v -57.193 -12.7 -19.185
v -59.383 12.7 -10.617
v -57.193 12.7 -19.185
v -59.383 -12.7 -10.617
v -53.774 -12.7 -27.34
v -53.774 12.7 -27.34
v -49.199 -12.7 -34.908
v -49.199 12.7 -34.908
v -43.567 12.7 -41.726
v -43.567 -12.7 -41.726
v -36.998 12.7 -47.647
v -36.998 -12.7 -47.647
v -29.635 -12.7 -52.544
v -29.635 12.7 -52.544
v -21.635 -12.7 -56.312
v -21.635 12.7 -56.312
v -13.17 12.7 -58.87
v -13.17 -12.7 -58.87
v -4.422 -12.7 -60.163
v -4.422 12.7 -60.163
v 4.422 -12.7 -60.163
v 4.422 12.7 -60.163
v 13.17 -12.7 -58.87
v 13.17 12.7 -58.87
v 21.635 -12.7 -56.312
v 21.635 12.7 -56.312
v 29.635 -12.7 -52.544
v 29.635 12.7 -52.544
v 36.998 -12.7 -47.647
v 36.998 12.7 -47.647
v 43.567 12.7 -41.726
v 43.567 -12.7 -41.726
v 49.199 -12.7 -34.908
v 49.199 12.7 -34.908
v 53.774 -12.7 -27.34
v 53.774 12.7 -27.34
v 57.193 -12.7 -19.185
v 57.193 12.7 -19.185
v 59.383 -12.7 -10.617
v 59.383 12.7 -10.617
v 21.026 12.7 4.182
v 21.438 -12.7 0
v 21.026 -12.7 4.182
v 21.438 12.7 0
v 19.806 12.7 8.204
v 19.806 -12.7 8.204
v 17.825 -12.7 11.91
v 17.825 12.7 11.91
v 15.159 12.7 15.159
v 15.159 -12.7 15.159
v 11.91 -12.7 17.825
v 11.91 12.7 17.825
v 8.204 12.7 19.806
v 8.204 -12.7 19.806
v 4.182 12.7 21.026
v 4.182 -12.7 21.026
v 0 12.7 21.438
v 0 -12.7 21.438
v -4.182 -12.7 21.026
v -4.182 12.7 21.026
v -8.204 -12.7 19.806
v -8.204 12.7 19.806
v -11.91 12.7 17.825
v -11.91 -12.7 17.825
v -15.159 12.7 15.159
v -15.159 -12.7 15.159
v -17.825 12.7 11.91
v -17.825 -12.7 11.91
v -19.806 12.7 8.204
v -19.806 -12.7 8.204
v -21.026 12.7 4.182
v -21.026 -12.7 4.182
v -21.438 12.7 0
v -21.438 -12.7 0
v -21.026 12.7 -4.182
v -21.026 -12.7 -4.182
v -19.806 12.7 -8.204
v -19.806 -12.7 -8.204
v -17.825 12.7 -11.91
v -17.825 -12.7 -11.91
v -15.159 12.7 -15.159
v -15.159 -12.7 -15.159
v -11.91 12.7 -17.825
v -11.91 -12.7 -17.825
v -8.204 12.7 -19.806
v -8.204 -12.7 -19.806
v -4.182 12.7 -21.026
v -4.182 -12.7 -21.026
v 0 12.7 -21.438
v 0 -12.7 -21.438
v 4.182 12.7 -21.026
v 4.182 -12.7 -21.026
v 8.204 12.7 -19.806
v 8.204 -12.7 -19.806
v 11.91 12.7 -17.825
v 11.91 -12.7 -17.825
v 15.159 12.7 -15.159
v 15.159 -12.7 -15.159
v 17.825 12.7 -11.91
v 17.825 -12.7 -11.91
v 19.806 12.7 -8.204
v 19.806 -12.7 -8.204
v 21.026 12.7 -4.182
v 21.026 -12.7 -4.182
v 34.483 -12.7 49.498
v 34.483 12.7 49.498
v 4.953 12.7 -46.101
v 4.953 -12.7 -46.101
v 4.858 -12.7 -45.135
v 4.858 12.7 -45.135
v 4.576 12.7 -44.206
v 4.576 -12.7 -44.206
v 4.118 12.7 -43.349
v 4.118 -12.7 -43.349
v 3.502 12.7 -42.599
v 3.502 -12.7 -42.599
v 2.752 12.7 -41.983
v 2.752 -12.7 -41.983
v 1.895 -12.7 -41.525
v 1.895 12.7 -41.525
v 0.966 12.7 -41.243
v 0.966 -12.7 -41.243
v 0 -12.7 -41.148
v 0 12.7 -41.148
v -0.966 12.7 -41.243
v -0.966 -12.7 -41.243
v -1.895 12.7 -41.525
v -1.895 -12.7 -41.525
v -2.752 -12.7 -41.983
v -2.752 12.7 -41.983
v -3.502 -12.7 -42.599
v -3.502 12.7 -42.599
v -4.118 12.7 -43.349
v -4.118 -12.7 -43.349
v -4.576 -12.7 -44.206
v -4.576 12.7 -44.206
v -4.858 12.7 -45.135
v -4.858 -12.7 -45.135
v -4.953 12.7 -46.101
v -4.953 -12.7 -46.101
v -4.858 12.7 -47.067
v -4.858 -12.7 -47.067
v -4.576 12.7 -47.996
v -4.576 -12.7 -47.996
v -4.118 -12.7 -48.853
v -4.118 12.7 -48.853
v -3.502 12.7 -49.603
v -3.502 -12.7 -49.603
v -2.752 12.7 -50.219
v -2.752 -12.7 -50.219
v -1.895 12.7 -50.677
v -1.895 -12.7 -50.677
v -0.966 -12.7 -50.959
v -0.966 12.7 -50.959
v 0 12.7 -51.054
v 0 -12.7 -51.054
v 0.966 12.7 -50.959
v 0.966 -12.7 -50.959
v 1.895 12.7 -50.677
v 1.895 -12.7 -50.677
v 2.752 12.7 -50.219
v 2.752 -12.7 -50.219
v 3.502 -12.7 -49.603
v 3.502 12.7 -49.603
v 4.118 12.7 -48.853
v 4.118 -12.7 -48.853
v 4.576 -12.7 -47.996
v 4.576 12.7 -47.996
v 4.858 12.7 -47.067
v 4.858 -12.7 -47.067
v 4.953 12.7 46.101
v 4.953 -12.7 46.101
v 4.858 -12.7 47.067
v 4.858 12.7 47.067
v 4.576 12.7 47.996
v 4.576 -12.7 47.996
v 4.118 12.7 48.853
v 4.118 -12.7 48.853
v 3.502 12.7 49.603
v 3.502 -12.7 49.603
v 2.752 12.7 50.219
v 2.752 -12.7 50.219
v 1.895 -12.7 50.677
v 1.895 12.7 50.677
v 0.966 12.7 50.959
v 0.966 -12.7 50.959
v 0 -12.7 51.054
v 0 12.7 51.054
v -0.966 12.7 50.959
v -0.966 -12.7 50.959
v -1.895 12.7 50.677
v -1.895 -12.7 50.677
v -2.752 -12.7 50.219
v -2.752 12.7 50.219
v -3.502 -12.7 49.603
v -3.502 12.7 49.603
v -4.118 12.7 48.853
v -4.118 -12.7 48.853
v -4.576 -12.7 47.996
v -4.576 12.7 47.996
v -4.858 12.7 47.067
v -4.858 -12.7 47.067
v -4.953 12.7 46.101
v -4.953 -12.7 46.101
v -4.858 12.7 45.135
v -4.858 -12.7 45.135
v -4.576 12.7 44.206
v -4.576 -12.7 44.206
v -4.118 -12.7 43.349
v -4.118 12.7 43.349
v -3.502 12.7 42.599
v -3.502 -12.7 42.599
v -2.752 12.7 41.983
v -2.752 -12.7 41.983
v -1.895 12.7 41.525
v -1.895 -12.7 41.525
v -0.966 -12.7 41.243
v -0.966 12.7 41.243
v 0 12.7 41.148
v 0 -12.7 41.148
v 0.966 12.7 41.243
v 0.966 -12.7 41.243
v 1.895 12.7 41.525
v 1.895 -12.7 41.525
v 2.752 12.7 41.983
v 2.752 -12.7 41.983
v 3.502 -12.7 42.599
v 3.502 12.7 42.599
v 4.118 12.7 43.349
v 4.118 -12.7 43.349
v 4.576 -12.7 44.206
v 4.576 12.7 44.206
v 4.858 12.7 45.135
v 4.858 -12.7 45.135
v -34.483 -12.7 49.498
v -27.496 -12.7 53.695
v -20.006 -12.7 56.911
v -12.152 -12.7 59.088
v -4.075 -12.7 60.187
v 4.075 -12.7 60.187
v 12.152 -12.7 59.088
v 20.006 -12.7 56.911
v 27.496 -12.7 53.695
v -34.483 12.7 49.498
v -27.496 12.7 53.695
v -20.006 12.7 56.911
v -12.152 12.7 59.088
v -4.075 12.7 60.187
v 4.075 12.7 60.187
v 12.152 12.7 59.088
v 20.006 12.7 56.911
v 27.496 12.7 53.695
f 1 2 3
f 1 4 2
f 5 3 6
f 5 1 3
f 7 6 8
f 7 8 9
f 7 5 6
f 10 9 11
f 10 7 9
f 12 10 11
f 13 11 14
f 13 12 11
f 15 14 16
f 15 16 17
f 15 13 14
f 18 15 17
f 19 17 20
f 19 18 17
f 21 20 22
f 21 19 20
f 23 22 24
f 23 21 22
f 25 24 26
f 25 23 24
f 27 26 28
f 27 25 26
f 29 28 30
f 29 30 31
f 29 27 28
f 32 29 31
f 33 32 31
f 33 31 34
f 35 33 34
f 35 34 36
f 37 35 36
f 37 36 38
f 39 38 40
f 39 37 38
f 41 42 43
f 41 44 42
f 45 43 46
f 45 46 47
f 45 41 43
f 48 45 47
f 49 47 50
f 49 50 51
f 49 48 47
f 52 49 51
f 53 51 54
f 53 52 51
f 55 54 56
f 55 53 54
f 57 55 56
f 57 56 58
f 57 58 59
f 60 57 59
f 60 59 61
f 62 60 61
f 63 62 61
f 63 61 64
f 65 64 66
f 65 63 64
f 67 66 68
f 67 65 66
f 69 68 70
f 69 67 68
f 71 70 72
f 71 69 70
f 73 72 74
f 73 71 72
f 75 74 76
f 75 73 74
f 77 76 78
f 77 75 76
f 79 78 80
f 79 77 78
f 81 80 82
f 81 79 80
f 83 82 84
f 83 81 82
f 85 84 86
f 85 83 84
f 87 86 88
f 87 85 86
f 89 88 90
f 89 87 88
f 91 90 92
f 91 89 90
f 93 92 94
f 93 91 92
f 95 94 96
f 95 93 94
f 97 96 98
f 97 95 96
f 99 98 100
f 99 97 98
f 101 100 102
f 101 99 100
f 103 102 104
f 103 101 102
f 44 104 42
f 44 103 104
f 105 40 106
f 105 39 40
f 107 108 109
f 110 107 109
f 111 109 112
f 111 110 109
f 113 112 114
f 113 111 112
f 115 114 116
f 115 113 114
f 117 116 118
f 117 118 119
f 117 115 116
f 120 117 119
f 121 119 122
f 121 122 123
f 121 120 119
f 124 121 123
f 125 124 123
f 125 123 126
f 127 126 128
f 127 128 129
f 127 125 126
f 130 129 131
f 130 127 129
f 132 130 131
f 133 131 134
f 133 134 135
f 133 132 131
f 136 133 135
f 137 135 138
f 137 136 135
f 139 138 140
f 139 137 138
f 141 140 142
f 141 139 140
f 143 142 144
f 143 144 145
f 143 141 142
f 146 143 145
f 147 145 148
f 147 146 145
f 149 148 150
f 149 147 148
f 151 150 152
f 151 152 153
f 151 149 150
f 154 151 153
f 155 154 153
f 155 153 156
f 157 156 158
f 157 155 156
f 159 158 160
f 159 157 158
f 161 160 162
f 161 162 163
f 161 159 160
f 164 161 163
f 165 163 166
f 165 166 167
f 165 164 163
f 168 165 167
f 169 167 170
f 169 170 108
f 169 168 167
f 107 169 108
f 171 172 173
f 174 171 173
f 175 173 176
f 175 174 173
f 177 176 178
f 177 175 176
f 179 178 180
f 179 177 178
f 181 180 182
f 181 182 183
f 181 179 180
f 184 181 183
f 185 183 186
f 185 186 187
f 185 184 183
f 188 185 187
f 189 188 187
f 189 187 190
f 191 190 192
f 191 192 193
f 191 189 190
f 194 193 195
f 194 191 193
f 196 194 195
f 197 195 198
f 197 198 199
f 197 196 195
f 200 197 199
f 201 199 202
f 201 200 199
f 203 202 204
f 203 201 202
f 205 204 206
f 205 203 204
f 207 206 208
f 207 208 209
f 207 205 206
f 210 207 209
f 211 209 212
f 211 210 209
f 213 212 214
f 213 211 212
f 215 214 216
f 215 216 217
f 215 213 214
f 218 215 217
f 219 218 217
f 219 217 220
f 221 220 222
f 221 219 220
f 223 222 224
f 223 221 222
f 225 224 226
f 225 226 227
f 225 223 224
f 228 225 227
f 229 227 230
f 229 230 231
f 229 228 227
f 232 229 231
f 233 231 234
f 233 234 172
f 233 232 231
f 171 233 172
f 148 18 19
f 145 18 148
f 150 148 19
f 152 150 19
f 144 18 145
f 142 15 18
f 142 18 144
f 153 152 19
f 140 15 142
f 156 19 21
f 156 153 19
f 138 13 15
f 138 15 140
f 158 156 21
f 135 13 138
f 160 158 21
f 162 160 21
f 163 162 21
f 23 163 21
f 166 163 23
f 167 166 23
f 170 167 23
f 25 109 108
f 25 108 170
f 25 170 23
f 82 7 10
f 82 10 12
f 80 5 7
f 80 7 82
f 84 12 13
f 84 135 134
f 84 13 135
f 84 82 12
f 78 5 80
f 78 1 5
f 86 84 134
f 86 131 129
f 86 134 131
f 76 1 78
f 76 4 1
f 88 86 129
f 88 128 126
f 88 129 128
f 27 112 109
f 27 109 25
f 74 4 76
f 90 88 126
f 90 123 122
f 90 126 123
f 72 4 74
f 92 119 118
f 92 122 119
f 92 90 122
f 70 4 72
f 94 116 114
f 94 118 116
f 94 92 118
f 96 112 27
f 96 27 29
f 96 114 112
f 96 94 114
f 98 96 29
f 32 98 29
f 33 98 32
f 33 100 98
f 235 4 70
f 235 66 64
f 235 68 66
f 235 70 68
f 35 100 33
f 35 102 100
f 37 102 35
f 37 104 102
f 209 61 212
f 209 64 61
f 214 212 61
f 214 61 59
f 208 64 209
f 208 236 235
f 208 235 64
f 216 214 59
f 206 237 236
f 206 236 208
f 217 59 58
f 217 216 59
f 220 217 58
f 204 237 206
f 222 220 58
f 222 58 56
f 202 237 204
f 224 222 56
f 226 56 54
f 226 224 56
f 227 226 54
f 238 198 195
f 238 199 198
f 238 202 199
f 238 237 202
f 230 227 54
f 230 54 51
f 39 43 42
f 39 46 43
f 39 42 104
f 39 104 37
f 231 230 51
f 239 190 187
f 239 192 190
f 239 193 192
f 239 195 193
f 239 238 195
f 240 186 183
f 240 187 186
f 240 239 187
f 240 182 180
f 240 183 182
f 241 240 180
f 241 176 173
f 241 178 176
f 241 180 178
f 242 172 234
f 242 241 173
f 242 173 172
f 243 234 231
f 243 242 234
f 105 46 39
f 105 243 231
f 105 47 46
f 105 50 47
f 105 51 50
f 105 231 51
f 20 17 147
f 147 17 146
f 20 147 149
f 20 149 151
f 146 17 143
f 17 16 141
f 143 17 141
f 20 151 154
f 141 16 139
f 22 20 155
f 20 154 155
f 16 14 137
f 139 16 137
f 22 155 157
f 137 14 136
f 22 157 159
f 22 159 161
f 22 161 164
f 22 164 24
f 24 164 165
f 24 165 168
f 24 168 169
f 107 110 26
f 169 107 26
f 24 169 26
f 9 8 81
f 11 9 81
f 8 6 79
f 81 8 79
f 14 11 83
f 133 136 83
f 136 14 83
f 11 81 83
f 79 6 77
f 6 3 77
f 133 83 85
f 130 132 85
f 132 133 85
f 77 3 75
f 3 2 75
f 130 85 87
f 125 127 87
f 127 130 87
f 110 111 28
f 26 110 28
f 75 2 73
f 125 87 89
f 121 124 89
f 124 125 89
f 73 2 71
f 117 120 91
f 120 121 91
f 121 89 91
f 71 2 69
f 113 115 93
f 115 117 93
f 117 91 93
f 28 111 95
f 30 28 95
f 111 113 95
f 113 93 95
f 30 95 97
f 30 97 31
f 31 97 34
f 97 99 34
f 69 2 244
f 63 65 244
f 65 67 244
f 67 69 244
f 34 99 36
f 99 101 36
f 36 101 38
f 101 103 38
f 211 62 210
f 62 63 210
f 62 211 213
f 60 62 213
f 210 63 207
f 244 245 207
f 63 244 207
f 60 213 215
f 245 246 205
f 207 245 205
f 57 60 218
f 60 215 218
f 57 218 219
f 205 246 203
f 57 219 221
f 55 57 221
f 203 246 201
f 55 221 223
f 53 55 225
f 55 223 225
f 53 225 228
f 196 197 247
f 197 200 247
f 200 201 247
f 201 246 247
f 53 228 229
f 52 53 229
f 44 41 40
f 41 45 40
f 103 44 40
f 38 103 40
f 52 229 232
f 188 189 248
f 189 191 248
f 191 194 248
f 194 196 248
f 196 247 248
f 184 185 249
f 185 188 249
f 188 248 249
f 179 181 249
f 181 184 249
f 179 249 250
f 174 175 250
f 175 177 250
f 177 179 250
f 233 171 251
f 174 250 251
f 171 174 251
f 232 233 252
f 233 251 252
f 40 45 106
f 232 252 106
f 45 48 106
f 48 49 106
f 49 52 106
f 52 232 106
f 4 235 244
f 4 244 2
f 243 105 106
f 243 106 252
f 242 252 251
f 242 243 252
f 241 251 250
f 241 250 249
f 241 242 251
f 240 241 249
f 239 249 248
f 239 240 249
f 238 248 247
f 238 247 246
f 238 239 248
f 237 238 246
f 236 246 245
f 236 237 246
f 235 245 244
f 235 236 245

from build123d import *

# Parameters (mm, degrees)
F0_R     = 4.953
F0_R_2   = 21.4376
F1_DEPTH = 12.7


with BuildPart() as f1:
    # F0 (on Front) → F1 (new body, symmetric)
    with BuildSketch(Plane.XZ):
        with BuildLine():
            Line((59.3833293236, -10.6172418004), (34.4828311796, 49.4978785287))
            ThreePointArc((34.4828311796, 49.4978785287), (0, 60.325), (-34.4828311796, 49.4978785287))
            Line((-34.4828311796, 49.4978785287), (-59.3833293236, -10.6172418004))
            ThreePointArc((-59.3833293236, -10.6172418004), (0, -60.325), (59.3833293236, -10.6172418004))
        make_face()
        with Locations((0, -46.101)):
            Circle(F0_R, mode=Mode.SUBTRACT)
        Circle(F0_R_2, mode=Mode.SUBTRACT)
        with Locations((0, 46.101)):
            Circle(F0_R, mode=Mode.SUBTRACT)
    extrude(amount=F1_DEPTH, both=True)


solid = f1.part
